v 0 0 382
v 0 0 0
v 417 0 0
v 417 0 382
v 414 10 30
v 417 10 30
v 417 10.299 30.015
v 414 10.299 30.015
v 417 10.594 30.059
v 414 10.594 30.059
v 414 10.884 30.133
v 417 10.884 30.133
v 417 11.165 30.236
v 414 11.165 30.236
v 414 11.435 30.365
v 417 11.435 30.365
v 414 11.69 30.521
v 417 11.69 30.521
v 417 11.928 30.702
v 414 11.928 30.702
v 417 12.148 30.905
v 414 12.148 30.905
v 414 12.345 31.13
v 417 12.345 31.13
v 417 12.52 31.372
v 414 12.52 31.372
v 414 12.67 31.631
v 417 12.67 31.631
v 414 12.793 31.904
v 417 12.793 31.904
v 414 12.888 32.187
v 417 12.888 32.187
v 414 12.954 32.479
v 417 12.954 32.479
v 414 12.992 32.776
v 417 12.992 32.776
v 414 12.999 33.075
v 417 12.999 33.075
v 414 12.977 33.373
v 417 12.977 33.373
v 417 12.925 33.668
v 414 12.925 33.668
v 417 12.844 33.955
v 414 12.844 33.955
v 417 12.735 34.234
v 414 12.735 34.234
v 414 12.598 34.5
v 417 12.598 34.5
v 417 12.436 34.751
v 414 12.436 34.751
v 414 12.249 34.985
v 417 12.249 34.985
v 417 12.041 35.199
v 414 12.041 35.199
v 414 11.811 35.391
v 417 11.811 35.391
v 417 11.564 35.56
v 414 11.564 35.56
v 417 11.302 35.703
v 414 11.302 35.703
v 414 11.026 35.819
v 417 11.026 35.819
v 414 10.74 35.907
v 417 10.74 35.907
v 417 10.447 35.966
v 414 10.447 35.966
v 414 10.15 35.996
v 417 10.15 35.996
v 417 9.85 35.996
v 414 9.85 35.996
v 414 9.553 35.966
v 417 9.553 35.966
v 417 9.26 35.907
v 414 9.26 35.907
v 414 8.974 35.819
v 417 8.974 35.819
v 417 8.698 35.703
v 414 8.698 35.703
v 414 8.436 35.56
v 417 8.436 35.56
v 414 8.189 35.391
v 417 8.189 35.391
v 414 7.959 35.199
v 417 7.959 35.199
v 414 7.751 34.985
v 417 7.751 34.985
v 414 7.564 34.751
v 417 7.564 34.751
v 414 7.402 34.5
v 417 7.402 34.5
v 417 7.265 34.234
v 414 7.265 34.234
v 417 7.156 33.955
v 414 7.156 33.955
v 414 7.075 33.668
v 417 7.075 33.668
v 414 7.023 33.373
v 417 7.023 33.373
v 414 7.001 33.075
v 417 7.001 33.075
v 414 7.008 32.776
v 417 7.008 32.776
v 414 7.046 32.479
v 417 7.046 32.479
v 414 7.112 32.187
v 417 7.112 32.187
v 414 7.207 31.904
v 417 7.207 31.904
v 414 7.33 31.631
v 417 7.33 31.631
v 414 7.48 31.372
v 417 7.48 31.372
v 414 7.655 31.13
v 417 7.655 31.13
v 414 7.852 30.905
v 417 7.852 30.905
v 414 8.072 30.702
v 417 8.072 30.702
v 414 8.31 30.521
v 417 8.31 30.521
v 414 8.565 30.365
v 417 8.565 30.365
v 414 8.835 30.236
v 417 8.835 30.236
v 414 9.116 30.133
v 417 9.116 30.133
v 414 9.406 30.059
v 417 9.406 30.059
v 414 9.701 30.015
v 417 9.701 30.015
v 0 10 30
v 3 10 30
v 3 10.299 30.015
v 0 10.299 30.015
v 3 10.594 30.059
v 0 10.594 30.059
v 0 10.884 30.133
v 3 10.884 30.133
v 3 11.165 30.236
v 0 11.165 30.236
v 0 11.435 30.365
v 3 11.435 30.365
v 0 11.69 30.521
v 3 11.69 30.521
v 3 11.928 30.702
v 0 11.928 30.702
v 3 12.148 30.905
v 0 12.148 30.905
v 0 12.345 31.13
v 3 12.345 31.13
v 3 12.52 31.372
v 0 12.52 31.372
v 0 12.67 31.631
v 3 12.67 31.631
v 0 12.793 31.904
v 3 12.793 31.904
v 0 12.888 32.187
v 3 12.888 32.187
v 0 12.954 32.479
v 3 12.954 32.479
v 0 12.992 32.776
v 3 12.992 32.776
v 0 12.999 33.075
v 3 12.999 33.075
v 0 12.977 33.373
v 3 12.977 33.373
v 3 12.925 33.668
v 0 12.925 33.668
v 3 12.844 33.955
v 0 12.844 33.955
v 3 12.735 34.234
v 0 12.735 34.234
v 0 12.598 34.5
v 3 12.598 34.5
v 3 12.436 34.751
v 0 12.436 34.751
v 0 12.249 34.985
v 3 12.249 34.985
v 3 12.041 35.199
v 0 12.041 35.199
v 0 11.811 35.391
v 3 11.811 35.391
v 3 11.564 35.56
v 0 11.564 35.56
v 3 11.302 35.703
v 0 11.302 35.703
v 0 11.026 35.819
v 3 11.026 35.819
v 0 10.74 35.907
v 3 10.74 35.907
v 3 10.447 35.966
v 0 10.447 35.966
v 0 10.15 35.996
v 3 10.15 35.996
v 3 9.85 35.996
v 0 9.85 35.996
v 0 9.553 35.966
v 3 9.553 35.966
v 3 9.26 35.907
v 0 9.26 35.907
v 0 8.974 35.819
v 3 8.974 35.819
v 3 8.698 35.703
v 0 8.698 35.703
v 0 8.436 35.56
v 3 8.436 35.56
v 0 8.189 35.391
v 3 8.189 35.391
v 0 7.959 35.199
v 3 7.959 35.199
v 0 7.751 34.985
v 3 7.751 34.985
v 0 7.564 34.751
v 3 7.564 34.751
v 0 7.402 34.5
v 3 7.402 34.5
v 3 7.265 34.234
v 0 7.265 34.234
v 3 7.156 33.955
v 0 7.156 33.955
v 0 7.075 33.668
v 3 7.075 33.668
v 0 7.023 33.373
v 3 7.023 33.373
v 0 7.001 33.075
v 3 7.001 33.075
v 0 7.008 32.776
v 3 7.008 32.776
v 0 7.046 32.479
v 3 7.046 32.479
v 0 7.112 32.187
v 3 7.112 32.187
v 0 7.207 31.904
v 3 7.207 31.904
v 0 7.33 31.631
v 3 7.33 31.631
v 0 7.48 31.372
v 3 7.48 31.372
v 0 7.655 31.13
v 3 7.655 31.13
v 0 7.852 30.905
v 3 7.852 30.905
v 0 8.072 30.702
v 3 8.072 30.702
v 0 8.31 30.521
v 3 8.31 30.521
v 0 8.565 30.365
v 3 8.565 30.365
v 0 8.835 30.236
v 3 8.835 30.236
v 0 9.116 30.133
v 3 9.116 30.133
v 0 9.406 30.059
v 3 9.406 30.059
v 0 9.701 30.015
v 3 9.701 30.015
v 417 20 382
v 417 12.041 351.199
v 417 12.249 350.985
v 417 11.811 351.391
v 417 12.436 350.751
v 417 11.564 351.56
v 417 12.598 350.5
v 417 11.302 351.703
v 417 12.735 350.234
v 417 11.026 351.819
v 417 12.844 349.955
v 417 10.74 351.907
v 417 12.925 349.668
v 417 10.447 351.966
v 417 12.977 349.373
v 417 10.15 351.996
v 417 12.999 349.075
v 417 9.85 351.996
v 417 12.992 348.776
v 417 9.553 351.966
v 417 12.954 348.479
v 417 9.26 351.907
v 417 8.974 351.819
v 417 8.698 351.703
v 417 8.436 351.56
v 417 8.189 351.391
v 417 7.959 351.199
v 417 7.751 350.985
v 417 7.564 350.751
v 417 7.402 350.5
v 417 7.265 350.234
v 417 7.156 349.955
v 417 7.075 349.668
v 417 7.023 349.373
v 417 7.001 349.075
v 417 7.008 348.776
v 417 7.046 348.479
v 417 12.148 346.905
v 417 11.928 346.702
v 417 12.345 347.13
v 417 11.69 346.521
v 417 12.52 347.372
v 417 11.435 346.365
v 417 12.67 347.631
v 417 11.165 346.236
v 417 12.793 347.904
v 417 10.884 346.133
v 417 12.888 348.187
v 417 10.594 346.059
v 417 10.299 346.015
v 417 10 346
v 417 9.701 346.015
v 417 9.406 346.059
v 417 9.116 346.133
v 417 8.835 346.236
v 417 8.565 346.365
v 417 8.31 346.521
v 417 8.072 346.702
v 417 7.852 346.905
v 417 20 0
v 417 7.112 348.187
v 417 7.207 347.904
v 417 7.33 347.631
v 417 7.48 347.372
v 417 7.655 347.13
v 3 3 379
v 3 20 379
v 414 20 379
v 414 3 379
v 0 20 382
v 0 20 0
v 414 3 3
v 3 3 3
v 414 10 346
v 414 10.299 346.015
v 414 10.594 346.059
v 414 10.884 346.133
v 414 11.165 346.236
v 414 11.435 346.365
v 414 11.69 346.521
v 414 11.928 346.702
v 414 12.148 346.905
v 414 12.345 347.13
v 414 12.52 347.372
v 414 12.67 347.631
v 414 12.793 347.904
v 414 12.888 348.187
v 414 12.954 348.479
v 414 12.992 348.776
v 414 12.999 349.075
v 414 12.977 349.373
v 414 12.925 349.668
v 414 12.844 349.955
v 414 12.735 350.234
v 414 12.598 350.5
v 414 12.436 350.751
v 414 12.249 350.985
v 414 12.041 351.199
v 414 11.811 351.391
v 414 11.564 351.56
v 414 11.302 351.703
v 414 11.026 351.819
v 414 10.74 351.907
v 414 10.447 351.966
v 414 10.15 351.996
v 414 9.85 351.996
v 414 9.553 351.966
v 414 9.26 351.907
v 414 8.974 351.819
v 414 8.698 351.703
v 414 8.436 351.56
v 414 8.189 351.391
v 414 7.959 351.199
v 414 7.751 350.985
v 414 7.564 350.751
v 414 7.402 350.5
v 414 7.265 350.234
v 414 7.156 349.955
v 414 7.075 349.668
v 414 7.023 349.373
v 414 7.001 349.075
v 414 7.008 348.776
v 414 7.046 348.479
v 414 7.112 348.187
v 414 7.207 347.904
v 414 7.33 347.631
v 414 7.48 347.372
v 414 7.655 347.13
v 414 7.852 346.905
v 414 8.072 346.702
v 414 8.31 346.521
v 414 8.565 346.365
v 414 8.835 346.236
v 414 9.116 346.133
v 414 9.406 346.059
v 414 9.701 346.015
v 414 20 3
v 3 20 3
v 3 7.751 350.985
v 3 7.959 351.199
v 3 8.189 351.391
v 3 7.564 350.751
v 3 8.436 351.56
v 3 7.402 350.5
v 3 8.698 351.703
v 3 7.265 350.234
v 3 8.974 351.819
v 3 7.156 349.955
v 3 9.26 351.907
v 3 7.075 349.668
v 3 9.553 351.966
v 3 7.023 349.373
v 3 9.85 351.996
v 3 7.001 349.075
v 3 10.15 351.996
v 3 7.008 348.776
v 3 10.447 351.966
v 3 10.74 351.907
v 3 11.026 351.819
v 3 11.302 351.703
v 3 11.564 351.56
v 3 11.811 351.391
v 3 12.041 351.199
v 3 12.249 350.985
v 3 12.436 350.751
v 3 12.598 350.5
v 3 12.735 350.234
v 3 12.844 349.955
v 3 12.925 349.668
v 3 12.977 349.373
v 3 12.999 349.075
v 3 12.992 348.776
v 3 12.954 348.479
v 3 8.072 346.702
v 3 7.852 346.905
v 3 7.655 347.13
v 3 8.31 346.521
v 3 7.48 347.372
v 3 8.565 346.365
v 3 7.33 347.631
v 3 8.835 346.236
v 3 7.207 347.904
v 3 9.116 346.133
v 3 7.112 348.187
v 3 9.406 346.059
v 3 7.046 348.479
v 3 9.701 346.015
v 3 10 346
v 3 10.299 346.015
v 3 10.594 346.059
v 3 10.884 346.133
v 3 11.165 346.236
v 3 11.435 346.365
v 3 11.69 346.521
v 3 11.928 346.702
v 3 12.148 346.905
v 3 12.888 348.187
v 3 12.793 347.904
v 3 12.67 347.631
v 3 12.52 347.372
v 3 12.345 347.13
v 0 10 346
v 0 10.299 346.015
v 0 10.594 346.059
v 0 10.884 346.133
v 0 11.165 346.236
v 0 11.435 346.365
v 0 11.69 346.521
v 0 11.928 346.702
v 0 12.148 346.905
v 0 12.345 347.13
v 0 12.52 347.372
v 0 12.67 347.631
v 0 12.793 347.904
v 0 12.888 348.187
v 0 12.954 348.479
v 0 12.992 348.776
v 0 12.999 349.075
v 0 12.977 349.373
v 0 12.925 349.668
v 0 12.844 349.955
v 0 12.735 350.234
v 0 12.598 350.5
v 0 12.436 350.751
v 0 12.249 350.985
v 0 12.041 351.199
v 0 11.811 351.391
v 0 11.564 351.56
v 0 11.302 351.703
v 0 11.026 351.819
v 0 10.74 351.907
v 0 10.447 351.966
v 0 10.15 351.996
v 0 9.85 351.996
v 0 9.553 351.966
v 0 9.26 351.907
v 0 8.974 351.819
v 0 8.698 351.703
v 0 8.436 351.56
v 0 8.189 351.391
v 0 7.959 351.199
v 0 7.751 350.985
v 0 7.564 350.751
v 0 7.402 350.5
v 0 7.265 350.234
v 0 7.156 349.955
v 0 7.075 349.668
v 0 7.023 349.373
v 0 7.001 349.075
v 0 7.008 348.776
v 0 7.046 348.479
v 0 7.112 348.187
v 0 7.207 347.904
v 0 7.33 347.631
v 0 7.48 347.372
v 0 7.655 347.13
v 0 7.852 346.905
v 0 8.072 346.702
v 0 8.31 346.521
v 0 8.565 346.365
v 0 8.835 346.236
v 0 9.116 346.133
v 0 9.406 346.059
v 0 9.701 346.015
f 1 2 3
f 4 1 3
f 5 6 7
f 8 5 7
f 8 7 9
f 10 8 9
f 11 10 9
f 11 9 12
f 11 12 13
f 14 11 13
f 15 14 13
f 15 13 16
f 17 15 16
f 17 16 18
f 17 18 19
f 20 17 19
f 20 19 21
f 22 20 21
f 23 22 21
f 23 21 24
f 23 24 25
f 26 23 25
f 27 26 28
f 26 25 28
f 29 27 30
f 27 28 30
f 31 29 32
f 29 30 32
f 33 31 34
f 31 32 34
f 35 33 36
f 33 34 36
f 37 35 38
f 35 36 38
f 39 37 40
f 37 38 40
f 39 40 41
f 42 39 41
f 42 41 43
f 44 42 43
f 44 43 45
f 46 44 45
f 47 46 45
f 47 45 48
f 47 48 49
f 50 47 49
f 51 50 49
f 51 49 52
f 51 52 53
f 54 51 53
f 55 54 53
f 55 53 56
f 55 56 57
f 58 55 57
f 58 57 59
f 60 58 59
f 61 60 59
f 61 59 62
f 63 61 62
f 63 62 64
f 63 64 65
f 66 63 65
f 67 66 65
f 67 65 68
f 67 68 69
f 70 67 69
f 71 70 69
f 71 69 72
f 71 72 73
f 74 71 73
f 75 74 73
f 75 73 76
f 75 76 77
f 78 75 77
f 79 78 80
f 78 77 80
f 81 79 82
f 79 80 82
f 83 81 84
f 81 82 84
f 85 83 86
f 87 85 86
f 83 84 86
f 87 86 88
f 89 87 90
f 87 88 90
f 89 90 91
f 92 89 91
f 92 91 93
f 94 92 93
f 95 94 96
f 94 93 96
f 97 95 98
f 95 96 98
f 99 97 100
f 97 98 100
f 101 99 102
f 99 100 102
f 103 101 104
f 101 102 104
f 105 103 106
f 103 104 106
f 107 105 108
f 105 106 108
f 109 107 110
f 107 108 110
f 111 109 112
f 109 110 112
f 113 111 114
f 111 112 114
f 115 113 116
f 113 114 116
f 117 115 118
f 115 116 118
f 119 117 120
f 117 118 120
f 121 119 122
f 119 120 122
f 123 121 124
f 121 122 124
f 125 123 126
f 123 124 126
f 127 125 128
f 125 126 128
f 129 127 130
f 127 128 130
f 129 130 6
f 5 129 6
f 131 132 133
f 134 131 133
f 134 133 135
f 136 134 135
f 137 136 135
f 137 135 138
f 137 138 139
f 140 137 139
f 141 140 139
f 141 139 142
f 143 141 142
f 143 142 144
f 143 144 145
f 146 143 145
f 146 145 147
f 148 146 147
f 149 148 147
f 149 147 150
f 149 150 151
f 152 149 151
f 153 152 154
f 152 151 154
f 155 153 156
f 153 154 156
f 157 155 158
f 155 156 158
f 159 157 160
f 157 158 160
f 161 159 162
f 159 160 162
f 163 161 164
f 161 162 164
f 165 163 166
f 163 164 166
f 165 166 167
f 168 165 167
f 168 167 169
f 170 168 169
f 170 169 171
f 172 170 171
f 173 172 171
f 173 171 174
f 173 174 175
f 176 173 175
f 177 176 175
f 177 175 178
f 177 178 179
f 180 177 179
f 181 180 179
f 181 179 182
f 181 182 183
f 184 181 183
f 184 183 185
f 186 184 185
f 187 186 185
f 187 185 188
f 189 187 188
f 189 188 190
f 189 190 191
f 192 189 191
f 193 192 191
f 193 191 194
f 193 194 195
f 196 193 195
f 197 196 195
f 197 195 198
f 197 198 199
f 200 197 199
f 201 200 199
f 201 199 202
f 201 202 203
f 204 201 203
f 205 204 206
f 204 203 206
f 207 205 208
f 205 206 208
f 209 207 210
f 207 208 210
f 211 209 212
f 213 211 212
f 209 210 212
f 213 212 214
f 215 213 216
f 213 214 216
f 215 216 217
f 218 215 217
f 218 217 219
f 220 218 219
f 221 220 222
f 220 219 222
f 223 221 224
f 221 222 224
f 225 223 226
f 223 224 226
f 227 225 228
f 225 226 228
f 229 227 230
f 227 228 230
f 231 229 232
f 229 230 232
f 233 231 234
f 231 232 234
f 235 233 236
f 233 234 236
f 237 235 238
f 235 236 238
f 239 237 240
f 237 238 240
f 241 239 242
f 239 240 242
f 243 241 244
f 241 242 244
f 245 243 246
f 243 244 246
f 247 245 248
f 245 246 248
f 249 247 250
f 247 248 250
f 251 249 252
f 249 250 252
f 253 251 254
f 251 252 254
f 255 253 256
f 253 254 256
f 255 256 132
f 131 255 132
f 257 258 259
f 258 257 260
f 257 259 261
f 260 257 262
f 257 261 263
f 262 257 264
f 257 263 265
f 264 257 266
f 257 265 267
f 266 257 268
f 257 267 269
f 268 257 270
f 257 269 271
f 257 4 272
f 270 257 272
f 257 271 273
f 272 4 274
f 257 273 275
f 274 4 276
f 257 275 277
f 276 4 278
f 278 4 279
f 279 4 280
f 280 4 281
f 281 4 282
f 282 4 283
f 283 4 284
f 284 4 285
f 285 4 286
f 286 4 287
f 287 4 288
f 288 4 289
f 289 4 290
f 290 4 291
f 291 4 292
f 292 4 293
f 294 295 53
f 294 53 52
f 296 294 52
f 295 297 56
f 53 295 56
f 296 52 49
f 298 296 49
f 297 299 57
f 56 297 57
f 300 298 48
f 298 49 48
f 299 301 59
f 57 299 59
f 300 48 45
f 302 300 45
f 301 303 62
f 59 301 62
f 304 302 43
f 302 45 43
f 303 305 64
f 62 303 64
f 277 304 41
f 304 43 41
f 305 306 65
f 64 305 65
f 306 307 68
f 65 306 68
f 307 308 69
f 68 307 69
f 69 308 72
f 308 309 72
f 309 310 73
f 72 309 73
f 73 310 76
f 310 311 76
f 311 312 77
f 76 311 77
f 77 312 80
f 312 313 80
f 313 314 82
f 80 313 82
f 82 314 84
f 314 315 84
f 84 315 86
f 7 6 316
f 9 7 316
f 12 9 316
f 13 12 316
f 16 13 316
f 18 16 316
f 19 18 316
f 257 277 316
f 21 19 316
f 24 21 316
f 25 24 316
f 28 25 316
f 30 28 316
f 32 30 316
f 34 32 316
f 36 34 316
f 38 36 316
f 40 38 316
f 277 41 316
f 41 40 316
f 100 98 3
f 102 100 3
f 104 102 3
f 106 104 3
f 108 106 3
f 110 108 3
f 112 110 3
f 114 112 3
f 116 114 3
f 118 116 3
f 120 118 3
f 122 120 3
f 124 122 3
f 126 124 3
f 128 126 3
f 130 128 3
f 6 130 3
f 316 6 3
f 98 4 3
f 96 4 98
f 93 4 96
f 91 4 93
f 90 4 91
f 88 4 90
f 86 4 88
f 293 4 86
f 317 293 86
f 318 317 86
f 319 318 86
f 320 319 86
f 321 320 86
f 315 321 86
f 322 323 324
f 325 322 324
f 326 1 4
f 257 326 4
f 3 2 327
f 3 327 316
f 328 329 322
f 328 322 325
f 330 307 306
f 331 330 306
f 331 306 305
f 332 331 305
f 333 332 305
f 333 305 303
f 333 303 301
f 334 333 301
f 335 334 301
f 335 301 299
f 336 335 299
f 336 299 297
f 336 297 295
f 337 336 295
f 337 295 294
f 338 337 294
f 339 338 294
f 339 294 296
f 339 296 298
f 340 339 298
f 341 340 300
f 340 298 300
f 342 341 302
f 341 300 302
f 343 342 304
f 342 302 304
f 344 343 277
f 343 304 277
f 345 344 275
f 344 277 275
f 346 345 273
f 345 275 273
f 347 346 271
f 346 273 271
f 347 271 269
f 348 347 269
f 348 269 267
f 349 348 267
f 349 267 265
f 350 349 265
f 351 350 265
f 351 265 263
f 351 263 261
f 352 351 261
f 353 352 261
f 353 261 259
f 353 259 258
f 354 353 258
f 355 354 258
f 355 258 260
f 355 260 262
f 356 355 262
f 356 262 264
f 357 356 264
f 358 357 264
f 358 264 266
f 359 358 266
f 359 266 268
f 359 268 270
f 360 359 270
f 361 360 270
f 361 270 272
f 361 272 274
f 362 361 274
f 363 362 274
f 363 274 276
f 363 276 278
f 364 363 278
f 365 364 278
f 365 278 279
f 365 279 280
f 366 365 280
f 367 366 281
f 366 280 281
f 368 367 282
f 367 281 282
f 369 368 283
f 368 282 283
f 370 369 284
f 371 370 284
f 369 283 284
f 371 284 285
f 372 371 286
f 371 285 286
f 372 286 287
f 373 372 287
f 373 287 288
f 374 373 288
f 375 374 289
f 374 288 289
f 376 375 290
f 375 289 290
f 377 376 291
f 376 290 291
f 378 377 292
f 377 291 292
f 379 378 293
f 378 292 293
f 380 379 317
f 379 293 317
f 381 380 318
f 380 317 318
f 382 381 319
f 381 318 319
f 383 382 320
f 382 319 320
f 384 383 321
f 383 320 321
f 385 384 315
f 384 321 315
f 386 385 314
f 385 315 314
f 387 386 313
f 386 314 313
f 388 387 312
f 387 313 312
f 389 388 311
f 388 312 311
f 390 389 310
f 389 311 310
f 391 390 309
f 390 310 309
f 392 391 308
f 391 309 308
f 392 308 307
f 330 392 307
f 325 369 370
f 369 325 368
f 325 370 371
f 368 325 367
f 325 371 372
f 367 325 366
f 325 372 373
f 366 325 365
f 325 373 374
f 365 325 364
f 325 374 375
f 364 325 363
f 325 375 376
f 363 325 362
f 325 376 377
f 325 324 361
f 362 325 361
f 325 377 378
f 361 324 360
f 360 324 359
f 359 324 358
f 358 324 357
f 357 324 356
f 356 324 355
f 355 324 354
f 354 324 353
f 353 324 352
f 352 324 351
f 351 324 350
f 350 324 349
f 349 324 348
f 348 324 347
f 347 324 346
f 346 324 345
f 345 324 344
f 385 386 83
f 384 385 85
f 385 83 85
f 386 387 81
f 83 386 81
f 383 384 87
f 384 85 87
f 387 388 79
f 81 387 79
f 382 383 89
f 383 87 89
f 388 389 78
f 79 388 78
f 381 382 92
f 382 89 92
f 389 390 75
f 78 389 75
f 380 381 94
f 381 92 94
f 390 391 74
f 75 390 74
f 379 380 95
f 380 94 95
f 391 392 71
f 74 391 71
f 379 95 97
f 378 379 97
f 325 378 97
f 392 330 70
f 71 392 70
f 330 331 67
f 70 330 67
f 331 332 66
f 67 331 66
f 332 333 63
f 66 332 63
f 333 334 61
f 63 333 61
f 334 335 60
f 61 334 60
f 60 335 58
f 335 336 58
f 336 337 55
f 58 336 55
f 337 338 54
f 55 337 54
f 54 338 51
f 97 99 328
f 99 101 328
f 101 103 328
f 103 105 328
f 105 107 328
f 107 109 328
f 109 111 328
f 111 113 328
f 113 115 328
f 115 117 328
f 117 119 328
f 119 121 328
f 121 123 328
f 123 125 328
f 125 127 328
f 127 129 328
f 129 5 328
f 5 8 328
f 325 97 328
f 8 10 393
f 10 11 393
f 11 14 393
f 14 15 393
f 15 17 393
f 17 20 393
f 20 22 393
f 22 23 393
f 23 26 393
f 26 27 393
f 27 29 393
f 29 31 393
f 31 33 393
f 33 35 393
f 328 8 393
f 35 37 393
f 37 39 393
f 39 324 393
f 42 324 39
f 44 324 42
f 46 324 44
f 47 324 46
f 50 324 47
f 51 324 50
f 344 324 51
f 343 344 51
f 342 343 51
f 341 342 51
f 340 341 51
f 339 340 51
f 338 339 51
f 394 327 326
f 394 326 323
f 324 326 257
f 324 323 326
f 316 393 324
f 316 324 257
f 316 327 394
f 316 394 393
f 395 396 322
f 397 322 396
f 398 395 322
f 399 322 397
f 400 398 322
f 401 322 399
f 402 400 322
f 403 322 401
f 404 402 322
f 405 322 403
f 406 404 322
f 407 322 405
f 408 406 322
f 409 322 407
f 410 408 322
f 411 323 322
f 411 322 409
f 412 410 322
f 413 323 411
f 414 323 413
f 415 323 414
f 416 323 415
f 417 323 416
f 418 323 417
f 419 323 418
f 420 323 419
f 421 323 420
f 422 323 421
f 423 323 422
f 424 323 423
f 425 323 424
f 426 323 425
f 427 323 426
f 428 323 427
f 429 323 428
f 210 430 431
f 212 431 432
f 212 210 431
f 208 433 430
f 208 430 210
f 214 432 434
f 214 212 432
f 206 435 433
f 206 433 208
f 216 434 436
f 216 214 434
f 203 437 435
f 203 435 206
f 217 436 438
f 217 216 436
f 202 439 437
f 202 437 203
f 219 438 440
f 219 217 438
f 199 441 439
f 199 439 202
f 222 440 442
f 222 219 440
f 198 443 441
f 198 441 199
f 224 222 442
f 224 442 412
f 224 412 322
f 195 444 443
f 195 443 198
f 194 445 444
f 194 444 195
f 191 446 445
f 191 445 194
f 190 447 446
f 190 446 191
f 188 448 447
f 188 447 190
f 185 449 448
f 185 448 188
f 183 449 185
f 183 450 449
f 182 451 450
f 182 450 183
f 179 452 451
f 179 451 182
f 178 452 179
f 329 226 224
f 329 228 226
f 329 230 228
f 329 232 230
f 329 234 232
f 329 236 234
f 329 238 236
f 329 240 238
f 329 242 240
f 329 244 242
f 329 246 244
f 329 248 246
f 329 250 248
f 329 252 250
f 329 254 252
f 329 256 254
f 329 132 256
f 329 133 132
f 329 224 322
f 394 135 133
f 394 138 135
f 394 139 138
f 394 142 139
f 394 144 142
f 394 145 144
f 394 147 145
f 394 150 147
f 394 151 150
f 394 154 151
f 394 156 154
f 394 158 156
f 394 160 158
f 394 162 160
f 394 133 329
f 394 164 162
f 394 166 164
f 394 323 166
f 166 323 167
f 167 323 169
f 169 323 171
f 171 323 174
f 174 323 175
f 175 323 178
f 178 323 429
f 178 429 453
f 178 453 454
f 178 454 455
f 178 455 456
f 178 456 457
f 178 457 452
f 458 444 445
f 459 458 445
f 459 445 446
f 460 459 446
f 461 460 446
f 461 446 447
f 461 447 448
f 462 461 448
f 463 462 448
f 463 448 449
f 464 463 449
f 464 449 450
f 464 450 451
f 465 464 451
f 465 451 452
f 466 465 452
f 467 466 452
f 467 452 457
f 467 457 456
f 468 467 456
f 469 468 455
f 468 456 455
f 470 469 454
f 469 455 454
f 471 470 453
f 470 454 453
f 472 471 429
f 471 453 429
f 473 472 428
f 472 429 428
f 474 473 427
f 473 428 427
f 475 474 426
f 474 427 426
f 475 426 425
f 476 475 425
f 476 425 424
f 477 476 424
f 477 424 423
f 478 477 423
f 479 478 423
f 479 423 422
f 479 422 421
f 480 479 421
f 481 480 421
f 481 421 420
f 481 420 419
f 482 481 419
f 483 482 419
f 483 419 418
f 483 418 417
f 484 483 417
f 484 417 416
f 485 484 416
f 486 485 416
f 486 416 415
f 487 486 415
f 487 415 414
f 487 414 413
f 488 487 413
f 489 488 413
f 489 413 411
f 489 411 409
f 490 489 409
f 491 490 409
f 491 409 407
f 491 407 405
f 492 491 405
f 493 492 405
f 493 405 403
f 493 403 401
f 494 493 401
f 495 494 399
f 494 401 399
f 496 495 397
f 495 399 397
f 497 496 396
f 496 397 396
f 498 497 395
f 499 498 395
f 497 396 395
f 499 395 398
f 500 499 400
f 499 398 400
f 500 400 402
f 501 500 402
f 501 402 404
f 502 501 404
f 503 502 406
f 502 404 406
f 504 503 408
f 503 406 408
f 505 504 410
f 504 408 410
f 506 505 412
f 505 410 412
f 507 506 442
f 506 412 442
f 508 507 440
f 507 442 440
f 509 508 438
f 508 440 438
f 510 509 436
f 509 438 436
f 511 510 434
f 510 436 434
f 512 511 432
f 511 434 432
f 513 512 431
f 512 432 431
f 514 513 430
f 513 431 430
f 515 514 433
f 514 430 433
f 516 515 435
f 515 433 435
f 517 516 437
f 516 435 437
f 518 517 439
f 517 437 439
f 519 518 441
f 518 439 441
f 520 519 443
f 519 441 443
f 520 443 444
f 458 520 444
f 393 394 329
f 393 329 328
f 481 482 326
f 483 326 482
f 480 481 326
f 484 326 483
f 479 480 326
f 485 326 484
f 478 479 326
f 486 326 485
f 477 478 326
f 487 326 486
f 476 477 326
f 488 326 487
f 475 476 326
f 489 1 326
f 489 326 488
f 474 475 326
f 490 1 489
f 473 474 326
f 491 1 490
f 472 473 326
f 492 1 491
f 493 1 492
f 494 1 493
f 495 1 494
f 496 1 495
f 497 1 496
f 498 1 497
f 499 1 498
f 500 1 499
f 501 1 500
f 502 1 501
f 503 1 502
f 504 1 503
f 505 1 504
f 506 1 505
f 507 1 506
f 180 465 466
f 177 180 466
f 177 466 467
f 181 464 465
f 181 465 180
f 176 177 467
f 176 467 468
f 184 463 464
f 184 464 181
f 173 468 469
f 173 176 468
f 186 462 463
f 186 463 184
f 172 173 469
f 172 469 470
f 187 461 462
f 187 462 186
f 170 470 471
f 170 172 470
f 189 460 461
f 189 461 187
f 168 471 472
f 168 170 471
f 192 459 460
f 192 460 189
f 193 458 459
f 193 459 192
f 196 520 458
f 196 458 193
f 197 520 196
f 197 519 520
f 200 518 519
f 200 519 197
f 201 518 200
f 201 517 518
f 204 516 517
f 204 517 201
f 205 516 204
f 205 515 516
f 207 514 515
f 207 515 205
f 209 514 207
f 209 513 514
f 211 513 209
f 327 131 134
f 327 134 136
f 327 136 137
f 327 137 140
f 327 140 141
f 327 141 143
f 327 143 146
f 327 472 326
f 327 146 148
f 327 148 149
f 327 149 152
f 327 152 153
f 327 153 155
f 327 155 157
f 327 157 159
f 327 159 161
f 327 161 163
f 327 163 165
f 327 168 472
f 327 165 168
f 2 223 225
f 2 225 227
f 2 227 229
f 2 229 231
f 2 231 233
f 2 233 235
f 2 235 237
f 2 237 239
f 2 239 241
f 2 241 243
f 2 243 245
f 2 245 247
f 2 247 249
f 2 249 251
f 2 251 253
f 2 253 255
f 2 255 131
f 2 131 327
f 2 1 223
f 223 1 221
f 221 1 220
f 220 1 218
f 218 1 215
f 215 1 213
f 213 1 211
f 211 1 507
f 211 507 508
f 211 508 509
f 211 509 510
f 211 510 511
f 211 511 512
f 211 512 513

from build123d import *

# Parameters (mm, degrees)
SKETCH_1_W          = 417
SKETCH_1_H          = 382
EXTRUDE_3_DEPTH     = 20
SKETCH_2_W          = 411
SKETCH_2_H          = 376
CUT_EXTRUDE_1_DEPTH = 17
SKETCH_3_R          = 3
CUT_EXTRUDE_2_DEPTH = 418


with BuildPart() as part:
    # 草圖1 → 填料-伸長3 (new body)
    with BuildSketch(Plane(origin=(0, 0, 0), x_dir=(1, 0, 0), z_dir=(0, 1, 0))):
        with Locations((208.5, -191)):
            Rectangle(SKETCH_1_W, SKETCH_1_H)
    extrude(amount=EXTRUDE_3_DEPTH)

    # 草圖2 → 除料-伸長1 (cut)
    with BuildSketch(Plane(origin=(0, 20, 0), x_dir=(1, 0, 0), z_dir=(0, 1, 0))):
        with Locations((208.5, -191)):
            Rectangle(SKETCH_2_W, SKETCH_2_H)
    extrude(amount=-CUT_EXTRUDE_1_DEPTH, mode=Mode.SUBTRACT)

    # 草圖3 → 除料-伸長2 (cut, through all)
    with BuildSketch(Plane(origin=(417, 0, 0), x_dir=(0, 0, -1), z_dir=(1, 0, 0))):
        with Locations((-33, 10)):
            Circle(SKETCH_3_R)
        with Locations((-349, 10)):
            Circle(SKETCH_3_R)
    extrude(amount=-CUT_EXTRUDE_2_DEPTH, mode=Mode.SUBTRACT)


solid = part.part
